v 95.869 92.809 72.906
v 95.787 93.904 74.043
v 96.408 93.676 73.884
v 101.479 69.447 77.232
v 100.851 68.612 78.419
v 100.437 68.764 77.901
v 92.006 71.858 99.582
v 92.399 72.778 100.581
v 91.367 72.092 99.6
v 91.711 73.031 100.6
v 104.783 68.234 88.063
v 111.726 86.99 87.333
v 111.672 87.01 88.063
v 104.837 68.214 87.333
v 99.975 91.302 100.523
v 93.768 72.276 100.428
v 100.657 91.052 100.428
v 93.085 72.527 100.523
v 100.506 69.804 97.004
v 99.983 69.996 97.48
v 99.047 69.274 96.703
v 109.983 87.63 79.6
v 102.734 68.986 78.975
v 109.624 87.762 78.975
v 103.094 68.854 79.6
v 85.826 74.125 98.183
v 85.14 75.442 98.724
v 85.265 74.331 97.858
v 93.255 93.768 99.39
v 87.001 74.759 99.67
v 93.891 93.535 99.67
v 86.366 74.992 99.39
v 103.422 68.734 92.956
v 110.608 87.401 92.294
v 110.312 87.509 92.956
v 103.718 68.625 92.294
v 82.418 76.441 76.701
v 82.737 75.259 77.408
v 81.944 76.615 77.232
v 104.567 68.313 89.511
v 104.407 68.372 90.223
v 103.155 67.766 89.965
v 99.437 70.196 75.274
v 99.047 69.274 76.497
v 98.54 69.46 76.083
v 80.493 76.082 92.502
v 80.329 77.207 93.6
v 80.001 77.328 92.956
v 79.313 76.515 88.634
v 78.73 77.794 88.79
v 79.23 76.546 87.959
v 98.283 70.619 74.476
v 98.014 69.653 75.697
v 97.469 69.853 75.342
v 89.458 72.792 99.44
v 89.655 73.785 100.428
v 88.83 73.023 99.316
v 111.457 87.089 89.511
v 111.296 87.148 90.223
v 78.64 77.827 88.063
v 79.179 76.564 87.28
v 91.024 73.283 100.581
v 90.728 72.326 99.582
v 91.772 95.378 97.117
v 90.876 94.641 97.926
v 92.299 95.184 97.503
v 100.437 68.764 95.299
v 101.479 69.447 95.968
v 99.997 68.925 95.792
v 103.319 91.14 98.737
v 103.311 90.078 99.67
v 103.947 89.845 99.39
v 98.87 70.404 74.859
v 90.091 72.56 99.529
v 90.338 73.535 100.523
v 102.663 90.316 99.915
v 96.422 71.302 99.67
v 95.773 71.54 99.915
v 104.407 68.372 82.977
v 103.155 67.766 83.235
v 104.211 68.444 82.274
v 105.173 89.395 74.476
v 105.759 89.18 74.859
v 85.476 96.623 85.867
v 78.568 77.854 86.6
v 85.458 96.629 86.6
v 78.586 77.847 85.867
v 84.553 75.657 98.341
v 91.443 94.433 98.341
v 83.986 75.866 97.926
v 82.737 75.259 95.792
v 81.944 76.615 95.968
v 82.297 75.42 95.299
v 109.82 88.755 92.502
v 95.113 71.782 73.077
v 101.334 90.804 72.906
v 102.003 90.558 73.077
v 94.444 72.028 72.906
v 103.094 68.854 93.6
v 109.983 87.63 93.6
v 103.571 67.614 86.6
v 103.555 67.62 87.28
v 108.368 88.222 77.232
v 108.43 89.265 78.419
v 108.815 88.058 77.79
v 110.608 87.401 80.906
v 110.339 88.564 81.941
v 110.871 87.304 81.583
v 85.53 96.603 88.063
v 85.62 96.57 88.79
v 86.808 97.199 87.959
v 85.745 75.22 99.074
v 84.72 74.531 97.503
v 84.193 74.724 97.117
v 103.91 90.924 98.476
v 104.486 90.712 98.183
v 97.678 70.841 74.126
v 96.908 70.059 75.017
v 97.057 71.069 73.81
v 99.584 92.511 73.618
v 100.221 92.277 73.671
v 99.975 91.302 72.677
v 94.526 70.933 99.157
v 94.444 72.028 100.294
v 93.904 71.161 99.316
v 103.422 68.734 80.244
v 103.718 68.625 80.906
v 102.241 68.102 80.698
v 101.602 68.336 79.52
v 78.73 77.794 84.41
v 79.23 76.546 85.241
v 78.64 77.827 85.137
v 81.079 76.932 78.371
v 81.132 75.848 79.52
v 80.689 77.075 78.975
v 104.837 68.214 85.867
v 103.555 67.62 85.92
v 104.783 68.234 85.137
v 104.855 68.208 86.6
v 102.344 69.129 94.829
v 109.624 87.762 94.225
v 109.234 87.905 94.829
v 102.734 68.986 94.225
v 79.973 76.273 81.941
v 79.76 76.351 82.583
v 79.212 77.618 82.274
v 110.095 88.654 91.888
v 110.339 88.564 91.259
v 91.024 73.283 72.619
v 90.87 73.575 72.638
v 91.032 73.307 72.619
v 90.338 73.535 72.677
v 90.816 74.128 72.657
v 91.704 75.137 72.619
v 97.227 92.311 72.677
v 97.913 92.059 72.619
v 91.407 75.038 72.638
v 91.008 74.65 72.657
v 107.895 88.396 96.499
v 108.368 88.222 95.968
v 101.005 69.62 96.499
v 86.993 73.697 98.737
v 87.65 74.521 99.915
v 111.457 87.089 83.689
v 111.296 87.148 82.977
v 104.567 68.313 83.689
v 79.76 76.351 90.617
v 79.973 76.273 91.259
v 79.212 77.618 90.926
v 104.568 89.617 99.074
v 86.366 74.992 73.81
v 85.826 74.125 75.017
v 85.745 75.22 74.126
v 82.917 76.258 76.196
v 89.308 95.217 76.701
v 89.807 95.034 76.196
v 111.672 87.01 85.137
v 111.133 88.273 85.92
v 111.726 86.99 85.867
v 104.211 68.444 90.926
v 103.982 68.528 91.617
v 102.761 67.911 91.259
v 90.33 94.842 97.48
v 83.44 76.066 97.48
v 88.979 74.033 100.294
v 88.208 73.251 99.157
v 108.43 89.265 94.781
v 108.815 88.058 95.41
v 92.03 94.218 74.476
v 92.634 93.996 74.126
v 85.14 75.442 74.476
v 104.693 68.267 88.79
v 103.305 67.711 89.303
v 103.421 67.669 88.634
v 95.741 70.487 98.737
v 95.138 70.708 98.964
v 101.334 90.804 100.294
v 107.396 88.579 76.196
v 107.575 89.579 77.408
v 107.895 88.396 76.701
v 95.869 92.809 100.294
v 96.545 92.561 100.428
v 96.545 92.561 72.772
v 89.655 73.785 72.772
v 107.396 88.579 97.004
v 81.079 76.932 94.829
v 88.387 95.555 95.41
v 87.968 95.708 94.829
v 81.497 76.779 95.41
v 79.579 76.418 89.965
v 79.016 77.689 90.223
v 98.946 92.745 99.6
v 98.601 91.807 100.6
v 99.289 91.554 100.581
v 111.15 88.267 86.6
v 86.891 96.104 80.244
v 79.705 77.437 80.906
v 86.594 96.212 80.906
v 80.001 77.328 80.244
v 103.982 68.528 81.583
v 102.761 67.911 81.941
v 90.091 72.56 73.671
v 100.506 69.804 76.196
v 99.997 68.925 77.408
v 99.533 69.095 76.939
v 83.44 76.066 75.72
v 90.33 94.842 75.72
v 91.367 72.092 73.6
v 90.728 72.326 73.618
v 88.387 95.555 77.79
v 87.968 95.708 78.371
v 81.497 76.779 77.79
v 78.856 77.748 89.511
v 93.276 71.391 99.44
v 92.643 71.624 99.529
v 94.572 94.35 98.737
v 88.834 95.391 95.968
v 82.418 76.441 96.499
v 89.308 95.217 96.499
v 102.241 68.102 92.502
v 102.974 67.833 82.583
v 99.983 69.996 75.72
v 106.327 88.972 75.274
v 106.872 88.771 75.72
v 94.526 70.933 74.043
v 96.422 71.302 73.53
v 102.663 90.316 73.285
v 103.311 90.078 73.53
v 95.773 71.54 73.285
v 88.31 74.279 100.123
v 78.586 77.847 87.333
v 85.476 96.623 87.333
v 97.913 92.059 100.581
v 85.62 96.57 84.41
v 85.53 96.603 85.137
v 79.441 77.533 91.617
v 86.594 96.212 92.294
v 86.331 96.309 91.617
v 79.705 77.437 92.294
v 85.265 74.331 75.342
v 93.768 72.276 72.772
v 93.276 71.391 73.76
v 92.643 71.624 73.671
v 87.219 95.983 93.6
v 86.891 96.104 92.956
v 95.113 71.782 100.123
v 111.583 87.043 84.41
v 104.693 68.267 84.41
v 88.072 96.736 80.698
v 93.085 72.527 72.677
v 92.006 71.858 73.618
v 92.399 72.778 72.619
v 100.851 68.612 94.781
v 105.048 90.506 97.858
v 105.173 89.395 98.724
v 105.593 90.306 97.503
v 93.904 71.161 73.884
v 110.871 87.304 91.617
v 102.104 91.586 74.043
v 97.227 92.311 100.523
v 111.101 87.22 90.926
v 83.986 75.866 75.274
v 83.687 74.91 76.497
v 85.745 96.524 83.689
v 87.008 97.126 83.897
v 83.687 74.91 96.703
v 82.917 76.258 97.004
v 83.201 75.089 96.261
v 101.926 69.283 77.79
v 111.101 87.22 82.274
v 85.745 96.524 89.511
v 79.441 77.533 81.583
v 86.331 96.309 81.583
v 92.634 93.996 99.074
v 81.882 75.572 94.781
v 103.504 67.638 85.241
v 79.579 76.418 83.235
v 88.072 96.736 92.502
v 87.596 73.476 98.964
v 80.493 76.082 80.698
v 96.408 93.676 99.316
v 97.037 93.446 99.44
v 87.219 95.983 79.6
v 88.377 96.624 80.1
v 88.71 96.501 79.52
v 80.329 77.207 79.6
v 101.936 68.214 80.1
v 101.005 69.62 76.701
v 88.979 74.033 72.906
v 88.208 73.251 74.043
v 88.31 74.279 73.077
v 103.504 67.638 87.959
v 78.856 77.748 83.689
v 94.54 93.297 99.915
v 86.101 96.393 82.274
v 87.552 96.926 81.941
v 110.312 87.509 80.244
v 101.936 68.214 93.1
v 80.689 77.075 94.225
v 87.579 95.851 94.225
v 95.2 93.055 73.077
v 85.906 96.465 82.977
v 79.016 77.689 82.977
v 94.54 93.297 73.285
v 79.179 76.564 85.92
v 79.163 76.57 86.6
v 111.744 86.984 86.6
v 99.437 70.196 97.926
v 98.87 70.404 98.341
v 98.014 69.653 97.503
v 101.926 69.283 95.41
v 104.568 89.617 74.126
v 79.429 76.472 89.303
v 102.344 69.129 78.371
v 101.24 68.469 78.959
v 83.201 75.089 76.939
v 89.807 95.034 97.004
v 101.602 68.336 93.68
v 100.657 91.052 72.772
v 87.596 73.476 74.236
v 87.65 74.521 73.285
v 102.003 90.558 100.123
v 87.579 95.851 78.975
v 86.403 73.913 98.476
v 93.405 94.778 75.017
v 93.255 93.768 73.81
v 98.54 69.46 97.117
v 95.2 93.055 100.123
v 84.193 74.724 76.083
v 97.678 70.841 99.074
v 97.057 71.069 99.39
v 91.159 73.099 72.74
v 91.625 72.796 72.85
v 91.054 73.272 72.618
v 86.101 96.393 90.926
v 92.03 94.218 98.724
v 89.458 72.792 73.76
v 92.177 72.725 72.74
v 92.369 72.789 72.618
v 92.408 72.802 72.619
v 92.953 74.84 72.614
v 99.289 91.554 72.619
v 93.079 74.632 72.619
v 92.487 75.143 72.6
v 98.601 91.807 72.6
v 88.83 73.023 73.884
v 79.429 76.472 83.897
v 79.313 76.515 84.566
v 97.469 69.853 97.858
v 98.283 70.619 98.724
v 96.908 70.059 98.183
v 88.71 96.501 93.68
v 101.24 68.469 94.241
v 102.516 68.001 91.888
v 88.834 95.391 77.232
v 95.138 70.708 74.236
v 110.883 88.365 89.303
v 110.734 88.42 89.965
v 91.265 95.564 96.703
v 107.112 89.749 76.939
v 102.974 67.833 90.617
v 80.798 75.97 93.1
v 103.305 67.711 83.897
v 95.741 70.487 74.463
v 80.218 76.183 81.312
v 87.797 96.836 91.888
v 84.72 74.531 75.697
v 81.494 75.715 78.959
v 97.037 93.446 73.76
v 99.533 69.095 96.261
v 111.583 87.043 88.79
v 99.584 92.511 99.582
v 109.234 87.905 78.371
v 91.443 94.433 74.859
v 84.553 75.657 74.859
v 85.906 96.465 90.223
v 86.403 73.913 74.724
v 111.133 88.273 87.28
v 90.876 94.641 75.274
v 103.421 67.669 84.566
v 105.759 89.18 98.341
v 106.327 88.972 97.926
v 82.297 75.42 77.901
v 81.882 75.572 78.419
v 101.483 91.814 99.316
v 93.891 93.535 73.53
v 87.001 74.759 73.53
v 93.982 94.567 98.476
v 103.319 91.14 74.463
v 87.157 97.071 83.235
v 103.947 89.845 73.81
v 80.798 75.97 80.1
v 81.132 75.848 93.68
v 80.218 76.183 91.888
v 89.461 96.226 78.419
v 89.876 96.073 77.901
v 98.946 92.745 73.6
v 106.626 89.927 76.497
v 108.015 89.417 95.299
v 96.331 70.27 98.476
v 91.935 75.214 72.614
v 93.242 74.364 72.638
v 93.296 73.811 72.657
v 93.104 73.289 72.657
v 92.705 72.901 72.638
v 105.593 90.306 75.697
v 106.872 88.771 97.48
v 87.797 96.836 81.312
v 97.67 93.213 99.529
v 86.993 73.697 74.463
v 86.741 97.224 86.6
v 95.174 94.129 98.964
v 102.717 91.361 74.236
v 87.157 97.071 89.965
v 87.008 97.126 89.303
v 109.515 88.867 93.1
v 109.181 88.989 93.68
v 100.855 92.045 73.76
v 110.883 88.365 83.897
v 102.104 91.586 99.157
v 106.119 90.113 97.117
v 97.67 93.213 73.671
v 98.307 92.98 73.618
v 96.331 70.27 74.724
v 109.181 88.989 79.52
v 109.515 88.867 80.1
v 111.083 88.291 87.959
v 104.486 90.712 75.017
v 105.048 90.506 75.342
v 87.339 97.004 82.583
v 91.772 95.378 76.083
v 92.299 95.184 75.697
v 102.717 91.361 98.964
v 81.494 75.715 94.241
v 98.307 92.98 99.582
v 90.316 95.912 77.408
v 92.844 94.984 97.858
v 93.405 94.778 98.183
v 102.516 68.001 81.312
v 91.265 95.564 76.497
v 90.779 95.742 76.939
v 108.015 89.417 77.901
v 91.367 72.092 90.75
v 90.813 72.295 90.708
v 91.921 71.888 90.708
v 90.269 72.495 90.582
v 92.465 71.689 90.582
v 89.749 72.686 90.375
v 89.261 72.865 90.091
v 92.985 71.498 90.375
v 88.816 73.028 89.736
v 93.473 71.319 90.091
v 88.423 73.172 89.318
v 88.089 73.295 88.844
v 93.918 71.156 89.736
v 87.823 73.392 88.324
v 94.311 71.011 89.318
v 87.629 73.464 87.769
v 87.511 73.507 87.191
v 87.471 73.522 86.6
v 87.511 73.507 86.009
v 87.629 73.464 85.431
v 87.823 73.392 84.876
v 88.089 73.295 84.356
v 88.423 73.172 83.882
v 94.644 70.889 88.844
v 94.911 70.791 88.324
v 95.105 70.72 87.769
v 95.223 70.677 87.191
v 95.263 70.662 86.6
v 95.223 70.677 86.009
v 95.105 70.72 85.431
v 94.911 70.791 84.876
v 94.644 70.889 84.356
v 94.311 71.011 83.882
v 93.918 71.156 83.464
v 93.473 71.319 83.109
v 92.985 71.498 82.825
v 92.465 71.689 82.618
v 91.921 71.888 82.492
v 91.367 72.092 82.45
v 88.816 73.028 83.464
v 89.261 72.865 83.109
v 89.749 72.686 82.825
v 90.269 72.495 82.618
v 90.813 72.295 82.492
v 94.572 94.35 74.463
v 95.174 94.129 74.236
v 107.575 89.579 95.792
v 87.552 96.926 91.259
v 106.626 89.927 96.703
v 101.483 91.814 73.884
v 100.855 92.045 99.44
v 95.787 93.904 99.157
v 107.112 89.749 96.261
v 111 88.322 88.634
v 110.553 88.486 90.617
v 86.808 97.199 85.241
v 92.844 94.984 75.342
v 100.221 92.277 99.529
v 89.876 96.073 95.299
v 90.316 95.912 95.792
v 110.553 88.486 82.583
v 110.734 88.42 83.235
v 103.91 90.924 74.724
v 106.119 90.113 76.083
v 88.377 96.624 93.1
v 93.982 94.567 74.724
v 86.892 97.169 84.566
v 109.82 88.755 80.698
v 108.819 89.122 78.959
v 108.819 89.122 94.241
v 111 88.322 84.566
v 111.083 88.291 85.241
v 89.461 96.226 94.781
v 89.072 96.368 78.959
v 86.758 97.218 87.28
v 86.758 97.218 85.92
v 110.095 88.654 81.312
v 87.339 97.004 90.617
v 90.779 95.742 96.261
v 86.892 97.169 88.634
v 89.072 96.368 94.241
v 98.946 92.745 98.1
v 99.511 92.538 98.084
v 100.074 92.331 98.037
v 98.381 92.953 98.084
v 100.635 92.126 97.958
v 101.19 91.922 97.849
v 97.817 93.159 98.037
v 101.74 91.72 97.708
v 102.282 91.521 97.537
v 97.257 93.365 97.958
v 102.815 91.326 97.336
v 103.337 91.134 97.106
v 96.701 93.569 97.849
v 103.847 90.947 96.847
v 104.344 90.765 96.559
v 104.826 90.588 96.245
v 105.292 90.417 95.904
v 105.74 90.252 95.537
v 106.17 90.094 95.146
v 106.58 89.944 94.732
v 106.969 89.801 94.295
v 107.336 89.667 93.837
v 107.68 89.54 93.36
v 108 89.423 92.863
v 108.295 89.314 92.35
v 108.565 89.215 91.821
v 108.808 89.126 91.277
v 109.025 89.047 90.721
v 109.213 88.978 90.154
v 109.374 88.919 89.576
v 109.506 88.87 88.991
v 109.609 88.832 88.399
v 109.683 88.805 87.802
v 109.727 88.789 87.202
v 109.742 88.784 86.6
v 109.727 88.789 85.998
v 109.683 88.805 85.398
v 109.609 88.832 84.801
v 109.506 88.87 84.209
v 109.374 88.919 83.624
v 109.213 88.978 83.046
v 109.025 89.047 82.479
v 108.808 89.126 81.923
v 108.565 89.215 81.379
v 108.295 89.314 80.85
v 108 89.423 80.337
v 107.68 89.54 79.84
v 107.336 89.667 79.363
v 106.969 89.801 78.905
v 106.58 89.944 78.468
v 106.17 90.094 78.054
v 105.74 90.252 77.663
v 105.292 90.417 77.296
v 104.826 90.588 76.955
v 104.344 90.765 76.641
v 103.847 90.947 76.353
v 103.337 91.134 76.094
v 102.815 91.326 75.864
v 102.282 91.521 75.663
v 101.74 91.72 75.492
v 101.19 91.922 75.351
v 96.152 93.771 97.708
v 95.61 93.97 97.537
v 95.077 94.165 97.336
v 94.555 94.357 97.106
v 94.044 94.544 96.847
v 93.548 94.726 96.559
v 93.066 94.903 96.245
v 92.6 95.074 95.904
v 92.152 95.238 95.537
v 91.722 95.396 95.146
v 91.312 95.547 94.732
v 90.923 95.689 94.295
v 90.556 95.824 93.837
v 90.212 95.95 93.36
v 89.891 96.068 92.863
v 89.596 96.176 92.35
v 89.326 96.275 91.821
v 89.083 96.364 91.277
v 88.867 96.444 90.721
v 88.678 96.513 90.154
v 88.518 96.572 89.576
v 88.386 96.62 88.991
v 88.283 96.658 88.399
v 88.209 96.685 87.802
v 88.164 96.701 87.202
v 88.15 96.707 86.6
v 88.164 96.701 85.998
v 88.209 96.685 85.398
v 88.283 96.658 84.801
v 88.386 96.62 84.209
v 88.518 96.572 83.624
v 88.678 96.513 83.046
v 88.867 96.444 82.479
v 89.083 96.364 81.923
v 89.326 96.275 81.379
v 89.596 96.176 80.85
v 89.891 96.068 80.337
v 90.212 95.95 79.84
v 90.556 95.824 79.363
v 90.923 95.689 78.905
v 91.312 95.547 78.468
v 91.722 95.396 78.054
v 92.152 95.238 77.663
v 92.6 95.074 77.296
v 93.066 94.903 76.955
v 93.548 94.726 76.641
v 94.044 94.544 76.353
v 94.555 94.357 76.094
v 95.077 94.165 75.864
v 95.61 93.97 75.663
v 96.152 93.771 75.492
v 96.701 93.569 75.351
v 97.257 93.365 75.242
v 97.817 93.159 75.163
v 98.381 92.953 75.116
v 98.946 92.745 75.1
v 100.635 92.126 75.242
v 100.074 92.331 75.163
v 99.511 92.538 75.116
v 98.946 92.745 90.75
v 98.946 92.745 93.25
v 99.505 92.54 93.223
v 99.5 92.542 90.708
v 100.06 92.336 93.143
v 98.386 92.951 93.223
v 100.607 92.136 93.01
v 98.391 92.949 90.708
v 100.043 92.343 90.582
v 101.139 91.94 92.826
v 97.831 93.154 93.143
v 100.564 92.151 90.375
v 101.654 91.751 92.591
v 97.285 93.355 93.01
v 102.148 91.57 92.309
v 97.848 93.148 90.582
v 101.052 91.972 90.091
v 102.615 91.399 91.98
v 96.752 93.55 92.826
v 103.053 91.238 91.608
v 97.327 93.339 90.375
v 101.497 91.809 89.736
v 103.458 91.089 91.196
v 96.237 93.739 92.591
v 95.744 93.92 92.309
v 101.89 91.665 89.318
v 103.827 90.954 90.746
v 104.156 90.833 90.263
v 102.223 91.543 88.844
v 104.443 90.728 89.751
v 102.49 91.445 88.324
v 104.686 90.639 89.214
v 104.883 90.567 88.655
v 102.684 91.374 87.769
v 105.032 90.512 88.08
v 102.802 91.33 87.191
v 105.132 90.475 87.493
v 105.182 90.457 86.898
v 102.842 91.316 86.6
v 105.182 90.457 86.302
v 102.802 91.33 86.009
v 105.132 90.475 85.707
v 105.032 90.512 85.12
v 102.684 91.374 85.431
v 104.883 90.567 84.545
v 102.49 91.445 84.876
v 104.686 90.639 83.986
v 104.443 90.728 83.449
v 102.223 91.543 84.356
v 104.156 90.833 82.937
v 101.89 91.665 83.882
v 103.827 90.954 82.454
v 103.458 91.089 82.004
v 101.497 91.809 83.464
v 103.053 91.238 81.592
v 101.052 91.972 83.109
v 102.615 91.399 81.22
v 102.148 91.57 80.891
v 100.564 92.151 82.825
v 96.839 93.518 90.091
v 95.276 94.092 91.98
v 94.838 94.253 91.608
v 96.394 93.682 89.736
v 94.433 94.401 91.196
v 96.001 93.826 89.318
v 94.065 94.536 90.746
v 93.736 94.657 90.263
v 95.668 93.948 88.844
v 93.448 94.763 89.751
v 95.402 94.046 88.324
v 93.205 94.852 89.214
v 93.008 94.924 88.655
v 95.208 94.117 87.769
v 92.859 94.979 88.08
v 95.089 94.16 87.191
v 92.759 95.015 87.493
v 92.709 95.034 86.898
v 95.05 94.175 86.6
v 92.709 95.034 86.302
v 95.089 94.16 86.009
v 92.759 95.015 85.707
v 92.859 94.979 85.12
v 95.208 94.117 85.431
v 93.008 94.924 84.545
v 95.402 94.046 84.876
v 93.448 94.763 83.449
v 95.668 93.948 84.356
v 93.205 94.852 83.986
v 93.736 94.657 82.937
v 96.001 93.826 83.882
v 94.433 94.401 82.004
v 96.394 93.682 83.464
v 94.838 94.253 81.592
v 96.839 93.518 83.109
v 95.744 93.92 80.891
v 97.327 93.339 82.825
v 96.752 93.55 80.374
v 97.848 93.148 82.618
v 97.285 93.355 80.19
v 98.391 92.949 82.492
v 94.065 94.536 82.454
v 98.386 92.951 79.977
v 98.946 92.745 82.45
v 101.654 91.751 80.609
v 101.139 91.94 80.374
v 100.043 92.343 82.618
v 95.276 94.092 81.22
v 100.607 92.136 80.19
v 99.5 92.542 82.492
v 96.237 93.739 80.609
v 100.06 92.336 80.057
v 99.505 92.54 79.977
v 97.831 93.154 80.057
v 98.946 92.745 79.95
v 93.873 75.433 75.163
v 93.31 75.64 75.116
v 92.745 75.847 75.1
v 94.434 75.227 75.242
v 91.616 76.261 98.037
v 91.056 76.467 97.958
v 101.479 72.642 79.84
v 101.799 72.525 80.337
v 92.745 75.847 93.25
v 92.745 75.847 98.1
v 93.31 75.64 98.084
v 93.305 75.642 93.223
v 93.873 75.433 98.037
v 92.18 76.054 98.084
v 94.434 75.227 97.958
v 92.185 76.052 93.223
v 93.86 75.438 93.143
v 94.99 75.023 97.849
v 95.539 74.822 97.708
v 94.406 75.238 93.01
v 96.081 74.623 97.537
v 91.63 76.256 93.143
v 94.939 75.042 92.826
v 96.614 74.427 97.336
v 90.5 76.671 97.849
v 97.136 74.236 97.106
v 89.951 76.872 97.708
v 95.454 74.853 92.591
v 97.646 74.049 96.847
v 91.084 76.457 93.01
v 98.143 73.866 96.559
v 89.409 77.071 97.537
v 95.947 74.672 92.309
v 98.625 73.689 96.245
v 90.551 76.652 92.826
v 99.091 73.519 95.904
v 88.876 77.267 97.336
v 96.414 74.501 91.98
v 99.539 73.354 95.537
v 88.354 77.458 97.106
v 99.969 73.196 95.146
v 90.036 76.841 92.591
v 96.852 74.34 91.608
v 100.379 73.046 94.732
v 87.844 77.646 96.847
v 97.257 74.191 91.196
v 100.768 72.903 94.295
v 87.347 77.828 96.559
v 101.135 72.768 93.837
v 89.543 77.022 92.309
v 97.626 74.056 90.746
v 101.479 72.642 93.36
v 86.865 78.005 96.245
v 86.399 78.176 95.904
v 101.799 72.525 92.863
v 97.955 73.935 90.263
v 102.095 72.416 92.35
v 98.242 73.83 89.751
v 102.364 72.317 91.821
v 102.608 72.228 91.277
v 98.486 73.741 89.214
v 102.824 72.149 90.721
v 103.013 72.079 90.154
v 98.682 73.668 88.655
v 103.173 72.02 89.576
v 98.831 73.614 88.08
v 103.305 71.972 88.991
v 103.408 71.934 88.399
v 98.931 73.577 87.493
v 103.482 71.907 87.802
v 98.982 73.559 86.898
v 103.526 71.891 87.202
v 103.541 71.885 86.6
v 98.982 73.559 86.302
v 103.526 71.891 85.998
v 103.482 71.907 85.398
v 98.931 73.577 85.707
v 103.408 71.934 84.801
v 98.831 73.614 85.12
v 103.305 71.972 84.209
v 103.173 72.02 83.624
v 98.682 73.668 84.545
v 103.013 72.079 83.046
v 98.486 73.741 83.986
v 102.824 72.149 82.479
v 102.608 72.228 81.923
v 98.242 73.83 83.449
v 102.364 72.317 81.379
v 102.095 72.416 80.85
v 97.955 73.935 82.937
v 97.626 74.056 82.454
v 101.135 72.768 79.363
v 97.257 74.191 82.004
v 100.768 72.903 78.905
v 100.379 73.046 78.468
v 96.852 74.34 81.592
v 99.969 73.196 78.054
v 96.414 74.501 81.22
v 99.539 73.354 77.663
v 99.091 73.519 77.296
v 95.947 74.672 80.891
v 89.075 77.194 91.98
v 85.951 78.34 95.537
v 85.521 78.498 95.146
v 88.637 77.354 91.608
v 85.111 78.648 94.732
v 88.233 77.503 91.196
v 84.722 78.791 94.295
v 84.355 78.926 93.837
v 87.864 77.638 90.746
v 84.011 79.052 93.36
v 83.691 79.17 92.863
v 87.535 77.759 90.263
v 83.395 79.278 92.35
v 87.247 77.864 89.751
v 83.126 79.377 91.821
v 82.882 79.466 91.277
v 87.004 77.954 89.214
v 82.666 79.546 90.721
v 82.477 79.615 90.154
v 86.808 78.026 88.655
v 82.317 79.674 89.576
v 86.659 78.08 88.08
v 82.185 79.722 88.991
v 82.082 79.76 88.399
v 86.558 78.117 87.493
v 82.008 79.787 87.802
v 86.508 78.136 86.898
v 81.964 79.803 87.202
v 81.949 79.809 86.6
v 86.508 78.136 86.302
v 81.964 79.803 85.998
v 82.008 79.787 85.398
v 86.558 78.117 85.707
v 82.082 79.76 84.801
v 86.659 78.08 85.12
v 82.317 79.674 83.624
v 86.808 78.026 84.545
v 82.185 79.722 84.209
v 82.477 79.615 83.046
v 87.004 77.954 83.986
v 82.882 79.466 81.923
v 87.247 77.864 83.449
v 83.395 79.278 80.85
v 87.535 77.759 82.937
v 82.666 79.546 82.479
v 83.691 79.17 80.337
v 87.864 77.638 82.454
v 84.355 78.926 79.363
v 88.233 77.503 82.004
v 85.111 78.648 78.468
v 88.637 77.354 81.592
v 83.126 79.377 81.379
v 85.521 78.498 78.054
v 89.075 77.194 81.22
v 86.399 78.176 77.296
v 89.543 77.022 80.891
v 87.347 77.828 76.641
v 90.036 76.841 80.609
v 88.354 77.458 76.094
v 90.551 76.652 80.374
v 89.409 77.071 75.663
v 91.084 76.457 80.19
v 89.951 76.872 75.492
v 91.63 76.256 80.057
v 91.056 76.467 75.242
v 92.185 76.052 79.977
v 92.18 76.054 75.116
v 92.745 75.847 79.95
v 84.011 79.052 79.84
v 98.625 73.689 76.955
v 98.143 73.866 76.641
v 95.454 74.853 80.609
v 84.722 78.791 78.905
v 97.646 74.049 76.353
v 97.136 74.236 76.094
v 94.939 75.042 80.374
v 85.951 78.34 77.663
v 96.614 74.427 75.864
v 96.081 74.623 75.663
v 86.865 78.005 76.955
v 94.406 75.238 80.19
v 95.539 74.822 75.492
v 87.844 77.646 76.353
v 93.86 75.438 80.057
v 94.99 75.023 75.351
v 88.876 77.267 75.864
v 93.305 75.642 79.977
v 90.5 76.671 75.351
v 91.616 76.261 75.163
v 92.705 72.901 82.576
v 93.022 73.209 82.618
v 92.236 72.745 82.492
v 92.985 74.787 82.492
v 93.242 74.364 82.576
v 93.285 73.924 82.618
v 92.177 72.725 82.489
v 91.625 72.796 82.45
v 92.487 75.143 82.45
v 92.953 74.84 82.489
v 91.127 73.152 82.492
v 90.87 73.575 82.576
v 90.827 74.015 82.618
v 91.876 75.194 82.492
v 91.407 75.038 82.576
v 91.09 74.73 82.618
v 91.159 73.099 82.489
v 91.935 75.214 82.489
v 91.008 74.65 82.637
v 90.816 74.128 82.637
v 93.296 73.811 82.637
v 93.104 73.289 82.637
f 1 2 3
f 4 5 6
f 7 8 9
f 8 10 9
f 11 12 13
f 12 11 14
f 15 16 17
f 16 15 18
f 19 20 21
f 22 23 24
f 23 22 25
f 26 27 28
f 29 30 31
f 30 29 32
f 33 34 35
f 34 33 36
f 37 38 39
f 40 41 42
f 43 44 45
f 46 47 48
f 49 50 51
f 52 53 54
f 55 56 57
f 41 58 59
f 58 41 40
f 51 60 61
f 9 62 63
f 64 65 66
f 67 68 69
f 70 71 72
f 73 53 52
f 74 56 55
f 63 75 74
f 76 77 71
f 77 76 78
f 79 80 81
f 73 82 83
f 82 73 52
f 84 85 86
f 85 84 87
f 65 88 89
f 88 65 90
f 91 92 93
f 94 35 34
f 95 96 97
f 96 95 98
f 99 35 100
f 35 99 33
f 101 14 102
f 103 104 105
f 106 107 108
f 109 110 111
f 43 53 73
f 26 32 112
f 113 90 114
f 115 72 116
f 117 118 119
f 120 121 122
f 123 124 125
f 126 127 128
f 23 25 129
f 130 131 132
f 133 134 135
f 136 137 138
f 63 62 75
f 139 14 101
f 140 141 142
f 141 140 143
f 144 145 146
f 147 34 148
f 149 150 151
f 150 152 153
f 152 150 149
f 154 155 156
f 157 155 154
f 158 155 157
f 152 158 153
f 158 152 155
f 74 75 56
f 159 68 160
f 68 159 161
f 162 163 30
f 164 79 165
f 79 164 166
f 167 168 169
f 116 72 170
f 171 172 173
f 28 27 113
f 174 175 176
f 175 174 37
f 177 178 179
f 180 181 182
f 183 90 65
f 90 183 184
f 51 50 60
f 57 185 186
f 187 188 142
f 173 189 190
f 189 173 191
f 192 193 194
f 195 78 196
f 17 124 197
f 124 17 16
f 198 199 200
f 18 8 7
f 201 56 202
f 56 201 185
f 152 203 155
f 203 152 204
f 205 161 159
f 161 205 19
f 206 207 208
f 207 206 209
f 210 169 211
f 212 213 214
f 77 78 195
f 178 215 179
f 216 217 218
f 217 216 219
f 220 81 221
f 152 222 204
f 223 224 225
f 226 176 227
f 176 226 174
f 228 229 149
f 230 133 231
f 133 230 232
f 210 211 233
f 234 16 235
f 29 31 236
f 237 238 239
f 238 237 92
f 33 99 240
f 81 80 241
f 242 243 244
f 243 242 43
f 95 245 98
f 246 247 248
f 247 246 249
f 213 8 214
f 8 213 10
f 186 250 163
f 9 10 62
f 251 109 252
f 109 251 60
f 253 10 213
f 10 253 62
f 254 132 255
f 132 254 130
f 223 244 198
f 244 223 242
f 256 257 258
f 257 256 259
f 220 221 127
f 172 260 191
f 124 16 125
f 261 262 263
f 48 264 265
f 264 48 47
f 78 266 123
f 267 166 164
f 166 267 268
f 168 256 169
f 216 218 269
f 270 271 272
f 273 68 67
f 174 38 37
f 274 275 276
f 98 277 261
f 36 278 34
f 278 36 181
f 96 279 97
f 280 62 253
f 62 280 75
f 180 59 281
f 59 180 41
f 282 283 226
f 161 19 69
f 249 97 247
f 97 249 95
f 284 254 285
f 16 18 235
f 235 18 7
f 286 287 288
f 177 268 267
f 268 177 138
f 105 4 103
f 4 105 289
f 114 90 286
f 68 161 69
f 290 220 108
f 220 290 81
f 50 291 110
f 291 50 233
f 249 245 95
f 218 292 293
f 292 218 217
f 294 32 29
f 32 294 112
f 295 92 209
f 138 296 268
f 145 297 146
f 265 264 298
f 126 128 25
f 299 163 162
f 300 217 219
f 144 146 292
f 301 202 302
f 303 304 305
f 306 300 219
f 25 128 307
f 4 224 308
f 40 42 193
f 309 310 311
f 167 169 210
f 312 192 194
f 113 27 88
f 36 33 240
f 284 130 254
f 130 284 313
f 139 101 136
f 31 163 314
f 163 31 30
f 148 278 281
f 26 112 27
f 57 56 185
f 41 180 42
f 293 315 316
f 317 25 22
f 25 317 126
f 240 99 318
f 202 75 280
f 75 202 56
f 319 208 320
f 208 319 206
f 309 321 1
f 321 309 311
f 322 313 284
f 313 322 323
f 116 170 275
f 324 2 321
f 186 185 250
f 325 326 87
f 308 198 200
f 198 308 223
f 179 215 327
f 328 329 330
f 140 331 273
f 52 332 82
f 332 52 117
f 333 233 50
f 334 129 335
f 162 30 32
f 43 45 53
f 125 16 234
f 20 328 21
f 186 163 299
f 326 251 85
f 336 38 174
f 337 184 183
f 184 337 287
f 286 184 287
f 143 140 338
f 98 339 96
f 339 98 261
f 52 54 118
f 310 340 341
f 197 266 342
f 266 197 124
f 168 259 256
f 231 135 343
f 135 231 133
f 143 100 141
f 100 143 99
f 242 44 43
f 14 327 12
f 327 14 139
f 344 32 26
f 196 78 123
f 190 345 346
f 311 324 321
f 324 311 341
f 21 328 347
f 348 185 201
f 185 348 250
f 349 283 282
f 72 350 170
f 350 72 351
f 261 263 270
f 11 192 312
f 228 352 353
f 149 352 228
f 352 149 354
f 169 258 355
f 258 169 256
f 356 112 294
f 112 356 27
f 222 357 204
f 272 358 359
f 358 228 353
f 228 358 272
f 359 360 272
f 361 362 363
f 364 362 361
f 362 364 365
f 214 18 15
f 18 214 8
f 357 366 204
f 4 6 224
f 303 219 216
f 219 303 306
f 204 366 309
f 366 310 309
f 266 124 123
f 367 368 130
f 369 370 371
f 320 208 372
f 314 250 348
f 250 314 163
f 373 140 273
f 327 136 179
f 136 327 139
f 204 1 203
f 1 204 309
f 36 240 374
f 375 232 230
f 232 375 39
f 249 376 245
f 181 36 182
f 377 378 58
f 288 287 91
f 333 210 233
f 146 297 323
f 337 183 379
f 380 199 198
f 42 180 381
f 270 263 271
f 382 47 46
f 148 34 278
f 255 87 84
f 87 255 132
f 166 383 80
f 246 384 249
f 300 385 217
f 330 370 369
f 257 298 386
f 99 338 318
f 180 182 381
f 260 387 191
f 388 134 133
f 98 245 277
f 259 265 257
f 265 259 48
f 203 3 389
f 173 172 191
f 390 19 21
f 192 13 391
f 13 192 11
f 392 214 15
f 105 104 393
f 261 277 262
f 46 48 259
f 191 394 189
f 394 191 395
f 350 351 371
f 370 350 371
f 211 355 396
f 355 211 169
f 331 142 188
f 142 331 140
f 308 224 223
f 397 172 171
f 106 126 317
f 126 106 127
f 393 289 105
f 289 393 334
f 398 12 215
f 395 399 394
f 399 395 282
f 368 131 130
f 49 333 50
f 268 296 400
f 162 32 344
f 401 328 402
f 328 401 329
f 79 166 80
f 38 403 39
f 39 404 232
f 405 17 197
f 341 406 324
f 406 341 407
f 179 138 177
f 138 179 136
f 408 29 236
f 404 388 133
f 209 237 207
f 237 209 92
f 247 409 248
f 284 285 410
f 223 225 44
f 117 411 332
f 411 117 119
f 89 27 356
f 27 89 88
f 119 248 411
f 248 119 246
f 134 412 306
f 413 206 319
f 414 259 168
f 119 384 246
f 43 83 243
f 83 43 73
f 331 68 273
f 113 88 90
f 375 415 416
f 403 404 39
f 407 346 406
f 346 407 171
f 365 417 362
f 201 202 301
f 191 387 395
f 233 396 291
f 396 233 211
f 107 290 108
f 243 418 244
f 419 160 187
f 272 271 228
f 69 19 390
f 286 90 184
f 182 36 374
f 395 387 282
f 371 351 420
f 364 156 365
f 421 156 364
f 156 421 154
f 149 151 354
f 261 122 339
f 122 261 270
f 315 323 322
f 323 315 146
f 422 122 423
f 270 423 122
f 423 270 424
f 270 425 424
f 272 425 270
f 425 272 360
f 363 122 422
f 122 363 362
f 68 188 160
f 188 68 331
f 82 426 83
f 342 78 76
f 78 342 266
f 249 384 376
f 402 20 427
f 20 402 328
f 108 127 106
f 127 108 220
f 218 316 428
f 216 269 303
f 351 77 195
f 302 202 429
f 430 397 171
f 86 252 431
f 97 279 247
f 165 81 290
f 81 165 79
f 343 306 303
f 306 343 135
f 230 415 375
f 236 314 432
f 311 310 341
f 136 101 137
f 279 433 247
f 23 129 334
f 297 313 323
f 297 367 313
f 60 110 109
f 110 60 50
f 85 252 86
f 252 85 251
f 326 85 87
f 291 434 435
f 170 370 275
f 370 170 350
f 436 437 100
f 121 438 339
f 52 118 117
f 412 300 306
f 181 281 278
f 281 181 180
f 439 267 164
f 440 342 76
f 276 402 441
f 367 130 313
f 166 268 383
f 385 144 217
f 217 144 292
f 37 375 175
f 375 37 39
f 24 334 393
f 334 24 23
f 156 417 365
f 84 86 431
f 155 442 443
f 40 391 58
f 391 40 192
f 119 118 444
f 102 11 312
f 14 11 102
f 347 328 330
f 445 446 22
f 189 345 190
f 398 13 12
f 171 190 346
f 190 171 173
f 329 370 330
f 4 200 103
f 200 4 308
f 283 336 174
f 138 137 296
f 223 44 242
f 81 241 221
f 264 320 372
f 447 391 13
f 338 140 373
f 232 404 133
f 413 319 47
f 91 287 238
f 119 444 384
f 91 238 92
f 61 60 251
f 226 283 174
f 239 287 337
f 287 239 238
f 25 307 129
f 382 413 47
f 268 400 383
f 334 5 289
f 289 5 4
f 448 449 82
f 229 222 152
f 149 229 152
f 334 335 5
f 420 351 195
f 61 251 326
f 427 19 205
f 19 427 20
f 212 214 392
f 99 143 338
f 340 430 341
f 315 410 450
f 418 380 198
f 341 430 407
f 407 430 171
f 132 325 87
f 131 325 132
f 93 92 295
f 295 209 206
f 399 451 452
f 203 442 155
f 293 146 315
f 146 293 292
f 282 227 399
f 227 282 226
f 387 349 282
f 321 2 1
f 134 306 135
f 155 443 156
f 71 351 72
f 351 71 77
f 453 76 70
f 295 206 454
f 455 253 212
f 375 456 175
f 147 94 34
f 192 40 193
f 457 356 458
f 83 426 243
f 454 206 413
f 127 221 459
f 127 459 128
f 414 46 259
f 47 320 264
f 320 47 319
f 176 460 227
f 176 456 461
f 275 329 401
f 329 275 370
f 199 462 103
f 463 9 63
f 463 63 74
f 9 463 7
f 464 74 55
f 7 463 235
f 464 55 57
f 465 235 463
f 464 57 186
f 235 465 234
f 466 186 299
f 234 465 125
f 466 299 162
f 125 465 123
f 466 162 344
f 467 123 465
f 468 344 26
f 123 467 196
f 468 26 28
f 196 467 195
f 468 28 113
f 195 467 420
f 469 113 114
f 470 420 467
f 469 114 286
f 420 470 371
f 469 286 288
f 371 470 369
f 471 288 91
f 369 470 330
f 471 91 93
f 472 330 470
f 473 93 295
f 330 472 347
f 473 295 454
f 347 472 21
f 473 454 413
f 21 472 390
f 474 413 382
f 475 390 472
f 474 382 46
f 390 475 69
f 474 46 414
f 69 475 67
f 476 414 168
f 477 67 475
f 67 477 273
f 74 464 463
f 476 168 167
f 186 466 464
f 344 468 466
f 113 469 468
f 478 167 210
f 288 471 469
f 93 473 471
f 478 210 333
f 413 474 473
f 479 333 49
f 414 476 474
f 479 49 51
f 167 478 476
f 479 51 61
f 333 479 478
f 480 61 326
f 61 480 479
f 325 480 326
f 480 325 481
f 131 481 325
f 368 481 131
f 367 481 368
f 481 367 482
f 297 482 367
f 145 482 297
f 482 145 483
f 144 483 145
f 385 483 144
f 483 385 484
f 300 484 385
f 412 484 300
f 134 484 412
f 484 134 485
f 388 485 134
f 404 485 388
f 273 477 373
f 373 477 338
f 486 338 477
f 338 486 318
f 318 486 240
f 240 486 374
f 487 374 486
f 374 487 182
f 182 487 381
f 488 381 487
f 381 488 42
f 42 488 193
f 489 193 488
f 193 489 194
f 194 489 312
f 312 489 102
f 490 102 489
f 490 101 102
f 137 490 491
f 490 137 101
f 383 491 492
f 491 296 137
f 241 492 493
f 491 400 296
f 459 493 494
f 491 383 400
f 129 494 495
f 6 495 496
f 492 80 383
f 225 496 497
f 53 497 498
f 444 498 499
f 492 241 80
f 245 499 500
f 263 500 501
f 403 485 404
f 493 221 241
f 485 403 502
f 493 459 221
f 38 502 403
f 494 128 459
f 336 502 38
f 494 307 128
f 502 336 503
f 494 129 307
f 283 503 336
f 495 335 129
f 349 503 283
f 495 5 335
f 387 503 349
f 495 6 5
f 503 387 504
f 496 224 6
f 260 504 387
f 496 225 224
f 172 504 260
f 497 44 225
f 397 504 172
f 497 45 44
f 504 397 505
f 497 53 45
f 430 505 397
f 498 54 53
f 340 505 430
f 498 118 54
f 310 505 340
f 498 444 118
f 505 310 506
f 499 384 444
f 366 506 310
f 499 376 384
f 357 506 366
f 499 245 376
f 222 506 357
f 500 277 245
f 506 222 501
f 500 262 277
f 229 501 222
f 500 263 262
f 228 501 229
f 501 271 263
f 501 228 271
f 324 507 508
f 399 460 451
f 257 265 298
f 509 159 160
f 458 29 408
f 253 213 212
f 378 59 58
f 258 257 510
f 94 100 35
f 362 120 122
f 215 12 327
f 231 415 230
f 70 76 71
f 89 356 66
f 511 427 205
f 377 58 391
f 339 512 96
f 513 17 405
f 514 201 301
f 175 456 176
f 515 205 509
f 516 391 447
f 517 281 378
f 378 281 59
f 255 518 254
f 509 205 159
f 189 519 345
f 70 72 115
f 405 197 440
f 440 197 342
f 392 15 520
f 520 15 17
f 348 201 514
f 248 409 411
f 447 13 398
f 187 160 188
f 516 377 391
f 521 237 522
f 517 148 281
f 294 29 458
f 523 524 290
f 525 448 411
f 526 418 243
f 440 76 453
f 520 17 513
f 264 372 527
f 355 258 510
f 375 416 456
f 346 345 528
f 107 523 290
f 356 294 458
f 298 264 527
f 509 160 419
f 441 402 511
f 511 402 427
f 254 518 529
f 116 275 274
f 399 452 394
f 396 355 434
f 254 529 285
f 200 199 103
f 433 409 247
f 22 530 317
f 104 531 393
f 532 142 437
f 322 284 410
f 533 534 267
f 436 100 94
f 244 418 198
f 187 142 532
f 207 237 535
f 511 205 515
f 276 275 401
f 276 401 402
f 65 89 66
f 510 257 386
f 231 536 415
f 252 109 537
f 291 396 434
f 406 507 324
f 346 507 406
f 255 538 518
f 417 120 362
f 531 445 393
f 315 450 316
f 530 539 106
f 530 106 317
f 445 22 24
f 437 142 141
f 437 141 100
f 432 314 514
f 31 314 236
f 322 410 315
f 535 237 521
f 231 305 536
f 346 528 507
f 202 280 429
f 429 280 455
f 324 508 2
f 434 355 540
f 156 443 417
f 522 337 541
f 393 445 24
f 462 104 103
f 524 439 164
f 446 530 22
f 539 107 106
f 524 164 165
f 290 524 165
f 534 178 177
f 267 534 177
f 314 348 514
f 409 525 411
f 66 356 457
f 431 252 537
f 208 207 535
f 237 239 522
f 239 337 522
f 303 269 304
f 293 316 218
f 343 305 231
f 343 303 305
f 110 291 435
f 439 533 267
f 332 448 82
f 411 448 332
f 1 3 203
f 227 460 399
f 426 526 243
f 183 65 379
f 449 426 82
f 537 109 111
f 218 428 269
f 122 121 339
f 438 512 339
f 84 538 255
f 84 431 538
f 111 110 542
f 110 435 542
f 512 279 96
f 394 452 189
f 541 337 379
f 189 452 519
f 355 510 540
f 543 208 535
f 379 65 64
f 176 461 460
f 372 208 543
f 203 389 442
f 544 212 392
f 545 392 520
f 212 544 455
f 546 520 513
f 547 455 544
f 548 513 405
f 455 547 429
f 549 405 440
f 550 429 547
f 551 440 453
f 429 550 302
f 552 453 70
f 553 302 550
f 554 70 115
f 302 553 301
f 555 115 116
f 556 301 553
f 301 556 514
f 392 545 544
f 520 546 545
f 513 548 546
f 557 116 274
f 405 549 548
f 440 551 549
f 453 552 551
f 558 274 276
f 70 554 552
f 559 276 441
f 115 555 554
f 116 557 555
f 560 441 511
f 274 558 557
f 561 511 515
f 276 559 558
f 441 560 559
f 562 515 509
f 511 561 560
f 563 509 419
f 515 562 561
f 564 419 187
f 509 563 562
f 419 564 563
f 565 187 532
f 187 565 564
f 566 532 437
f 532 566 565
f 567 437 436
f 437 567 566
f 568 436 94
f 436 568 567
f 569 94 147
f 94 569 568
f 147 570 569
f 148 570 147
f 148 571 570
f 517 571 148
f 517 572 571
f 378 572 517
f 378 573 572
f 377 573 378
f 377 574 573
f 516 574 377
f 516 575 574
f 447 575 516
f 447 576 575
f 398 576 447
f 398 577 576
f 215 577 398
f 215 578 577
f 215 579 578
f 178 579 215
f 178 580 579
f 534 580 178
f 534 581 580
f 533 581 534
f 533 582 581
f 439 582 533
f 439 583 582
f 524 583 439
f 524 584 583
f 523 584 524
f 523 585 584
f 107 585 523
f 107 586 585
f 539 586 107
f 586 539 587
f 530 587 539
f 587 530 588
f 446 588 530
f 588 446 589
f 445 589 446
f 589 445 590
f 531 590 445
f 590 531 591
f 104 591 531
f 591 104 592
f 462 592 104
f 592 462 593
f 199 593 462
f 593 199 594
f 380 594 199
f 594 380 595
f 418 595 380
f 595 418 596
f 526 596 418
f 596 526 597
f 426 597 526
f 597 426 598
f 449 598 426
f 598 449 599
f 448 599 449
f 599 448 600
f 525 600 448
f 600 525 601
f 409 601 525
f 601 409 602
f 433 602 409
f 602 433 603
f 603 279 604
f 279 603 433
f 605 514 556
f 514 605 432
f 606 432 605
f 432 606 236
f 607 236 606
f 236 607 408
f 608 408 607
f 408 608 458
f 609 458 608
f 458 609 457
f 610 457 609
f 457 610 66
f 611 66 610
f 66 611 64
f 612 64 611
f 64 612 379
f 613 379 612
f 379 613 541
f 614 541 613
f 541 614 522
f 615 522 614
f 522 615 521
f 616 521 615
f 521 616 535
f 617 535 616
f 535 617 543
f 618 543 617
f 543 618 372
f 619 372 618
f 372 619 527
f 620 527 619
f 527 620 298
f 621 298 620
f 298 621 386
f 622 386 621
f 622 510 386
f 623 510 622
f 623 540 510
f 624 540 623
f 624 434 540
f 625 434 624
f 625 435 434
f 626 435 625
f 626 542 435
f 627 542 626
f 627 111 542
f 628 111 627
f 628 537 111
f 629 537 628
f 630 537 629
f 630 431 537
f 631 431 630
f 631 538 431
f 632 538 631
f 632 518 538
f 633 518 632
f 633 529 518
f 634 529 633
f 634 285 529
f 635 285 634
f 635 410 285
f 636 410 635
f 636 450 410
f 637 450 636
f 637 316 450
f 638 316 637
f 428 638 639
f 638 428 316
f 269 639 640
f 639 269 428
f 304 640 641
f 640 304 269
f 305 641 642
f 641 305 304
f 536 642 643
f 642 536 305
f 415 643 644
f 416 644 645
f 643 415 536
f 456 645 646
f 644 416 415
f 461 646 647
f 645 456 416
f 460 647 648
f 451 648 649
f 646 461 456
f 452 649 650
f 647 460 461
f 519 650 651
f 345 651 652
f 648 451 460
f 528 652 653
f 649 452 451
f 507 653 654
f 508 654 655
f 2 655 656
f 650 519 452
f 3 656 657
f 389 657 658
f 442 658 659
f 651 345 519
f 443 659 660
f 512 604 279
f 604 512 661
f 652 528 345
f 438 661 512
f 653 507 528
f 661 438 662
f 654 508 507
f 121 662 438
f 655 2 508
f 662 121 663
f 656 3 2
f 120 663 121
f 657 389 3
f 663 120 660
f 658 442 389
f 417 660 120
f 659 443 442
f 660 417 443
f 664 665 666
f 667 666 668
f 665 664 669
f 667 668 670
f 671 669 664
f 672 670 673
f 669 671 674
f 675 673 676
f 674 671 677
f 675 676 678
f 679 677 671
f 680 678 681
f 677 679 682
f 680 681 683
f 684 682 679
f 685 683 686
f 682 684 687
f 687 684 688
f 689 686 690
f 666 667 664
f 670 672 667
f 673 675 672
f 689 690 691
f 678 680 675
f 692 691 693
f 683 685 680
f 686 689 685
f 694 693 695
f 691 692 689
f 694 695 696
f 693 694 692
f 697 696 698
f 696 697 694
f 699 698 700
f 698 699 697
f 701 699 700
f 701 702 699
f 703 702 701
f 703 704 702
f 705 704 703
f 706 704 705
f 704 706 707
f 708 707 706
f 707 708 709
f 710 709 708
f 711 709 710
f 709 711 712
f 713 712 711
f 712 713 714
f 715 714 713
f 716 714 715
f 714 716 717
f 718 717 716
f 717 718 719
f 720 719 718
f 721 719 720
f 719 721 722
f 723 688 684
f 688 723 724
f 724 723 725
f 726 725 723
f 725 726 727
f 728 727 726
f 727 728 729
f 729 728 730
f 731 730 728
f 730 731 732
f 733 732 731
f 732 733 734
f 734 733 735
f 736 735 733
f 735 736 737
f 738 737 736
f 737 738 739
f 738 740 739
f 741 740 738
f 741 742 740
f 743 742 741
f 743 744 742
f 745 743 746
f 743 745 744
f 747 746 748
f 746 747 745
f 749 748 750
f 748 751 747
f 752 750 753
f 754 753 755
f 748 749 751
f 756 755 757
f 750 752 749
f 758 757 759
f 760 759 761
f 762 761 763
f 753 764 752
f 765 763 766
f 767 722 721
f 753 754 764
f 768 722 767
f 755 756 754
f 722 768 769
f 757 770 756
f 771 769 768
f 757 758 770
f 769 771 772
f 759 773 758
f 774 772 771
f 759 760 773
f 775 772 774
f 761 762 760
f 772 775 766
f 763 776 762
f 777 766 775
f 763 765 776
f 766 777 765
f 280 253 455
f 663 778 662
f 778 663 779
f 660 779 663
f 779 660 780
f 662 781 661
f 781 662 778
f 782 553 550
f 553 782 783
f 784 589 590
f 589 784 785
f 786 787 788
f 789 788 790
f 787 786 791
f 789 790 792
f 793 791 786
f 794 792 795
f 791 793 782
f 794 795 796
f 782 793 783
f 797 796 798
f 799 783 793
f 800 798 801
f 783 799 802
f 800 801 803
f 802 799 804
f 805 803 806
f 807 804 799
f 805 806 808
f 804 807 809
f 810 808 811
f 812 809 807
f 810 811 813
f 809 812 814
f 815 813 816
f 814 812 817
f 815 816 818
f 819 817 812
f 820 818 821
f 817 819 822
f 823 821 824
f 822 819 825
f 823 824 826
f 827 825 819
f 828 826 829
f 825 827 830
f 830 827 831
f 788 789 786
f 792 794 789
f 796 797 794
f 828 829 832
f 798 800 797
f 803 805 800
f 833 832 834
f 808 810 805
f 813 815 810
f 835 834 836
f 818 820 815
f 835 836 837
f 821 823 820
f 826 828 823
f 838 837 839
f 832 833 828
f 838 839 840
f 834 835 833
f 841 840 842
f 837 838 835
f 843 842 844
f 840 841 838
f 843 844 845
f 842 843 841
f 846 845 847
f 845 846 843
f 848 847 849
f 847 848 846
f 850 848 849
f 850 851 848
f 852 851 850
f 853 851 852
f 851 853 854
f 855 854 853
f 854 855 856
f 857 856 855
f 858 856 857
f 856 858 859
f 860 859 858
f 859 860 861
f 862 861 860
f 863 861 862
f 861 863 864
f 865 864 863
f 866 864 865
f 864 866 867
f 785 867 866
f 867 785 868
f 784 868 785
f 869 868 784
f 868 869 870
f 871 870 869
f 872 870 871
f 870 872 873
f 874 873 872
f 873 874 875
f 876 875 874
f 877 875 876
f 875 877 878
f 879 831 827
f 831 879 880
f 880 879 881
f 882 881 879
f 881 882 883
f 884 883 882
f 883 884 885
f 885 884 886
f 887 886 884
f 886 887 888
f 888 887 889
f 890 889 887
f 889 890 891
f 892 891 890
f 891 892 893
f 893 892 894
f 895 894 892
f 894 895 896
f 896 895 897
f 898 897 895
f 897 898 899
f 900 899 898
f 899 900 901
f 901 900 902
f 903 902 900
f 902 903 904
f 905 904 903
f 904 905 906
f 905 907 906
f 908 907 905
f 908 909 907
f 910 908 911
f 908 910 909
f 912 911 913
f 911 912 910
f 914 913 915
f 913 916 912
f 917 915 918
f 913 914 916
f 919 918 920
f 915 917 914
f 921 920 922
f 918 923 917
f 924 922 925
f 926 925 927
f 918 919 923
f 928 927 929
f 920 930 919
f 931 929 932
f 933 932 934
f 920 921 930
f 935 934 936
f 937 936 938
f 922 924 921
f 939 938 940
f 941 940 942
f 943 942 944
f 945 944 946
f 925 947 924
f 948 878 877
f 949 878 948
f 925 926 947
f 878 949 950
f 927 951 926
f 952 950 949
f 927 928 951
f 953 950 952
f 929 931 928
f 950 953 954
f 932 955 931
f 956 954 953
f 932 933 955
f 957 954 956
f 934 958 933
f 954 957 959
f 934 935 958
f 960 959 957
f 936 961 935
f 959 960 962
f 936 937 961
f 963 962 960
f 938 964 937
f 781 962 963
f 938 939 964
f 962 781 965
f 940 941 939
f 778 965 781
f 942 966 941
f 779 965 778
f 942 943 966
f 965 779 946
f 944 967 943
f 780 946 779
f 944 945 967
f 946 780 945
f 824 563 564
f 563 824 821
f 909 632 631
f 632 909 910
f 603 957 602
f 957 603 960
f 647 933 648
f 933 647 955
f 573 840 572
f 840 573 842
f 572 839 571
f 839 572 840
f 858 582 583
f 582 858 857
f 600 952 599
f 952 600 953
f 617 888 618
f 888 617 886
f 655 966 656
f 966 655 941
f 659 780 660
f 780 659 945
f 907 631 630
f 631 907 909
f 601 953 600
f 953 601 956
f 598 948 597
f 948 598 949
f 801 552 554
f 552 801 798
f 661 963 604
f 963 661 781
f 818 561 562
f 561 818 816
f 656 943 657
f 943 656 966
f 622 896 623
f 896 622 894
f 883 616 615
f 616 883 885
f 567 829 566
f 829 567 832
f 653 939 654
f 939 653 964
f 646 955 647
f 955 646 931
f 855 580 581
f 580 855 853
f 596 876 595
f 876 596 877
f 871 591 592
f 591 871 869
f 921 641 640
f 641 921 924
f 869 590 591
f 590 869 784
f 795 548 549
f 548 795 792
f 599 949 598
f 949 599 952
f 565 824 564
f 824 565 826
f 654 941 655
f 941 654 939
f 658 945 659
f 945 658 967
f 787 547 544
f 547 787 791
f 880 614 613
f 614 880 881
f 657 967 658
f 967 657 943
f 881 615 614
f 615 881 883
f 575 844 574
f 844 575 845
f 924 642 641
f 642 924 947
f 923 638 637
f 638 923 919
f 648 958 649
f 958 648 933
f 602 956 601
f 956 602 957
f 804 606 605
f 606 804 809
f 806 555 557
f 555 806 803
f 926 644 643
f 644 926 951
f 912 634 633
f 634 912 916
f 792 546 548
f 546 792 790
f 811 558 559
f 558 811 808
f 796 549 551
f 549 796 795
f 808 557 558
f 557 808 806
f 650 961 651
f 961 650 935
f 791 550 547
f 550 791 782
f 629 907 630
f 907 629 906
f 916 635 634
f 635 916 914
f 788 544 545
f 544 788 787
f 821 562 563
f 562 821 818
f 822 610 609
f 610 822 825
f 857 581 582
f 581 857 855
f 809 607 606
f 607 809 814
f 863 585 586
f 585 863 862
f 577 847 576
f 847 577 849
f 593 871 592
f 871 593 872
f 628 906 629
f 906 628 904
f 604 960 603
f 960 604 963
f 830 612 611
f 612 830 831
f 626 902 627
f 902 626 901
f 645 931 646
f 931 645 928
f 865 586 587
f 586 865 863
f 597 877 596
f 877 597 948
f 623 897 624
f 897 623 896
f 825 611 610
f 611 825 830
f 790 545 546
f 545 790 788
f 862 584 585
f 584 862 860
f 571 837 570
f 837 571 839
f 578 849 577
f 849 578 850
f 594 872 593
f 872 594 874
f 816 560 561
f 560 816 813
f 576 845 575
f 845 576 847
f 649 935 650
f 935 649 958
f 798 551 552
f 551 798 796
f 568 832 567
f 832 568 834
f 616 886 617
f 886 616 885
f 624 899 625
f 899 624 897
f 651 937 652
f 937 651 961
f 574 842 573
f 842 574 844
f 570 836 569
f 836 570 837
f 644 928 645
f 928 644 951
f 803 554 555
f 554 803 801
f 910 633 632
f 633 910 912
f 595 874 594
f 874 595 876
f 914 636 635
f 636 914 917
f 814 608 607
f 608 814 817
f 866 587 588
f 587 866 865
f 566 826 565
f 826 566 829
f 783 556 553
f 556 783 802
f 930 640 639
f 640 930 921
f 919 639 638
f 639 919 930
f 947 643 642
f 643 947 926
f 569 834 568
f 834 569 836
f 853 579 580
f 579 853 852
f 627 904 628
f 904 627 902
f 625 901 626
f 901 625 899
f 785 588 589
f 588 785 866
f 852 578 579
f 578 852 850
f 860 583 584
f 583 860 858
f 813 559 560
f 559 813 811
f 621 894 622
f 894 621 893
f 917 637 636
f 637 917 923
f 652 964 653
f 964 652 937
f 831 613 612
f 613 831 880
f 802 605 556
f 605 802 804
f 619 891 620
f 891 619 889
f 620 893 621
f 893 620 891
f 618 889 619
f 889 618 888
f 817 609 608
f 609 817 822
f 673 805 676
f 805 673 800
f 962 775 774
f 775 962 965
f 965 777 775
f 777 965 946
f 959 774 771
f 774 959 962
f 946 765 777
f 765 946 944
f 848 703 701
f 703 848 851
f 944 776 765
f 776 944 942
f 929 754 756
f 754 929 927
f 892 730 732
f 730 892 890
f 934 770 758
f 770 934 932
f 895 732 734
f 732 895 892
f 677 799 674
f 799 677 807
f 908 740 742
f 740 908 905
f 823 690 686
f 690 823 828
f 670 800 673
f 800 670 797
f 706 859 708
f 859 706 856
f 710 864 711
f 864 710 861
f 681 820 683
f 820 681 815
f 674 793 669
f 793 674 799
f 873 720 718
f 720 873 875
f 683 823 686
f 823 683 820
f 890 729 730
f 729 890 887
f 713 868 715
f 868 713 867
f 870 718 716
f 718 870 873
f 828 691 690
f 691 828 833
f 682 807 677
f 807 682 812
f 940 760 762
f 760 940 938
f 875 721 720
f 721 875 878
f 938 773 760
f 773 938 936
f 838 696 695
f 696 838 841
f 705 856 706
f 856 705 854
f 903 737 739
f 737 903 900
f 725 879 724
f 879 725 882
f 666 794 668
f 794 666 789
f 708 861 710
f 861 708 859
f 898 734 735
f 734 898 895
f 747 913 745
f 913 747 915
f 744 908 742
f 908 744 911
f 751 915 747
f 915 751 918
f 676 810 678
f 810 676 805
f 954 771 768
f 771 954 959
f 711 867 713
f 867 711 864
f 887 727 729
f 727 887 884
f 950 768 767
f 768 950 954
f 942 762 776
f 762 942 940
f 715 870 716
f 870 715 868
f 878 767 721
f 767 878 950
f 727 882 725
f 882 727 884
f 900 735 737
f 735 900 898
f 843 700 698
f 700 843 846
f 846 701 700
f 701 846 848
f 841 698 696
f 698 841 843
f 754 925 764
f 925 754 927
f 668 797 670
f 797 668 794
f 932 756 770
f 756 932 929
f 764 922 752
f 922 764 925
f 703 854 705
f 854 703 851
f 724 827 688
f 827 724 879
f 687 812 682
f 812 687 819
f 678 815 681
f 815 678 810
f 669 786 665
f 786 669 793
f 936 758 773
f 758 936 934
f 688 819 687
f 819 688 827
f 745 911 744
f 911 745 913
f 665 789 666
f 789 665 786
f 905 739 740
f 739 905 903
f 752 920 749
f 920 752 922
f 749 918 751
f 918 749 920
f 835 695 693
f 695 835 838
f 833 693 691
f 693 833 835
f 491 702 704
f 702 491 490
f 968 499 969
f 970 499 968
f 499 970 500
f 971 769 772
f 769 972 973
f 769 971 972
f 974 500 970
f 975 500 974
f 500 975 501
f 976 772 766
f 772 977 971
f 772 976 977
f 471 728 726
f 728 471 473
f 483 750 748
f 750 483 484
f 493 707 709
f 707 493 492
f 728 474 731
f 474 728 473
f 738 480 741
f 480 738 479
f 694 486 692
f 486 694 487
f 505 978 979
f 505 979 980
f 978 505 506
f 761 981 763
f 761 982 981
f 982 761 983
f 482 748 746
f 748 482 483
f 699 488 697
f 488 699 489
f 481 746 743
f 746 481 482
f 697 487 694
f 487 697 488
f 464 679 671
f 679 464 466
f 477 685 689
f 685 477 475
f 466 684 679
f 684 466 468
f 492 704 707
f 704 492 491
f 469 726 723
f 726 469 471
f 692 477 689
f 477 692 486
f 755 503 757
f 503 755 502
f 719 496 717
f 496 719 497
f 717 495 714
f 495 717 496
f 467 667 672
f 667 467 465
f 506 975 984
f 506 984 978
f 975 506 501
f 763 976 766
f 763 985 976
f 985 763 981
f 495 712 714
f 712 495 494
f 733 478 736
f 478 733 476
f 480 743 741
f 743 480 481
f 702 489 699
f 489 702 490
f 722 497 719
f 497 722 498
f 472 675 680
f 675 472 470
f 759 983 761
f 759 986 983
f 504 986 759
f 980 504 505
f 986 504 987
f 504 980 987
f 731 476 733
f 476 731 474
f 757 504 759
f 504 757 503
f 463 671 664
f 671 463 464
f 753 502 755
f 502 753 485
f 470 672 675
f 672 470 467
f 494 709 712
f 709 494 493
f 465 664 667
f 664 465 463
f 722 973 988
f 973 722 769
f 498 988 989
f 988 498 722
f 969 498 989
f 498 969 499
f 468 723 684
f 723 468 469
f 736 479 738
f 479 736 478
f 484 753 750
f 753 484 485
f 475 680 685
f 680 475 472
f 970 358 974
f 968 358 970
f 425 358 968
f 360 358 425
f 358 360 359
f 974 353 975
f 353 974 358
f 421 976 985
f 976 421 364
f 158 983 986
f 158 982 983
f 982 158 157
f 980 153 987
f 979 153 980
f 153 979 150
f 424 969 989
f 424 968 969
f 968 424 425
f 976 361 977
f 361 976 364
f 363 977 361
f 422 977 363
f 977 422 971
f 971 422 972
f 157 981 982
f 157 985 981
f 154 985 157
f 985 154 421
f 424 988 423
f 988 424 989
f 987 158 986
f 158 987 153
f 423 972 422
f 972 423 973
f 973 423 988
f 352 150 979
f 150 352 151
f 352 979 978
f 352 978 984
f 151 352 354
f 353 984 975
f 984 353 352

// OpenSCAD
// file: ../lib/common.scad
// ============================================================================
//  Вспомогательные модули общего назначения.
//  Подключать через use <lib/common.scad> — файл не содержит параметров
//  проекта и ни от чего не зависит.
// ============================================================================

_eps = 0.01;

// --------------------------------------------------------------------- 2D ---
// Прямоугольник со скруглёнными углами, по центру
module rrect(w, d, r) {
    rr = min(r, w/2 - _eps, d/2 - _eps);
    if (rr > 0) offset(r = rr) square([w - 2*rr, d - 2*rr], center = true);
    else square([w, d], center = true);
}

// --------------------------------------------------------------------- 3D ---
// Коробка со скруглением ТОЛЬКО вертикальных рёбер: нижние и верхние острые
module rounded_box(w, d, h, r) linear_extrude(height = h) rrect(w, d, r);

// Цилиндр с фасками на торцах (снимает «слоновью ногу» и облегчает посадку)
module chamfered_cyl(d, h, ch = 0.6, bottom = true, top = true) {
    r  = d/2;
    cb = bottom ? min(ch, h/2) : 0;
    ct = top    ? min(ch, h/2) : 0;
    if (cb <= 0 && ct <= 0) cylinder(d = d, h = h);
    else rotate_extrude(angle = 360) polygon(concat(
        [[0, 0]],
        cb > 0 ? [[r - cb, 0], [r, cb]] : [[r, 0]],
        ct > 0 ? [[r, h - ct], [r - ct, h]] : [[r, h]],
        [[0, h]]));
}

// Труба
module tube(od, id, h) difference() {
    cylinder(d = od, h = h);
    translate([0, 0, -_eps]) cylinder(d = id, h = h + 2*_eps);
}

// Сквозное отверстие, растянутое вверх-вниз для гарантированного вычитания
module thru(d, h) translate([0, 0, -_eps]) cylinder(d = d, h = h + 2*_eps);

// Потайное отверстие под саморез с конической головкой.
// Пластина занимает z = [0 .. t], головка утапливается сверху,
// саморез идёт вниз (в ответную стойку).
module countersunk_hole(free_d, head_d, t, down = 30) {
    cone_h = (head_d - free_d)/2;    // головка 90 градусов
    union() {
        translate([0, 0, -down]) cylinder(d = free_d, h = down + t - cone_h + _eps);
        translate([0, 0, t - cone_h]) cylinder(d1 = free_d, d2 = head_d, h = cone_h);
    }
}

// Паз (щелевое отверстие) длиной len по X, сквозной по высоте h
module slot(len, d, h) hull() for (s = [-1, 1])
    translate([s*(len - d)/2, 0, 0]) cylinder(d = d, h = h);

// Стойка под саморез: цилиндр с пилотным отверстием сверху.
// Снизу фаски нет — стойка растёт из дна детали.
module screw_boss(od, h, pilot_d, pilot_depth, ch = 0.6) difference() {
    chamfered_cyl(od, h, ch = ch, bottom = false, top = true);
    translate([0, 0, h - pilot_depth]) cylinder(d = pilot_d, h = pilot_depth + _eps);
}

// Треугольная косынка в плоскости XZ (катеты l по X и h по Z), толщина t по Y
module gusset(l, h, t) translate([0, -t/2, 0]) linear_extrude(height = t)
    polygon([[0, 0], [l, 0], [0, h]]);

// Конусное гнездо под заточенный винт-ось (ось Z вниз от z=0)
module cone_seat(d, depth) translate([0, 0, -depth])
    cylinder(d1 = 0.2, d2 = d, h = depth + _eps);

// Канавка под круглый пассик: тор, вычитаемый из обода
module belt_groove(pulley_d, groove_r) rotate_extrude(angle = 360)
    translate([pulley_d/2, 0]) circle(r = groove_r);

// Сетка облегчающих отверстий по кругу
module radial_holes(n, r, d, h) for (i = [0 : n - 1])
    rotate([0, 0, i*360/n]) translate([r, 0, 0]) thru(d, h);
// main file
// ============================================================================
//  ПРОТИВОВЕС ТОНАРМА
//
//  Стакан, который надевается на хвостовик и фиксируется винтом.
//  Полость сзади засыпается дробью/гайками М8 и заливается эпоксидкой:
//  так массу можно подобрать под конкретную головку (для AT91 с
//  прижимной силой ~2 г нужно порядка 25-30 г на вылете ~30 мм).
//  Точная настройка — продольным перемещением по хвостовику.
//
//  Печать: стоя, открытой полостью вверх.
// ============================================================================

include <../params.scad>
use <../lib/common.scad>

module tonearm_counterweight(az = arm_tube_azimuth_at(arm_groove_r_out)) {
    bore_d  = arm_cw_stub_d + arm_cw_bore_clr;
    hub_od  = bore_d + 2*arm_cw_wall;
    cav_d   = arm_cw_d - 2*arm_cw_wall;
    cav_h   = arm_cw_h - 4;
    cw_x    = -(arm_cw_center_dist + arm_cw_h/2);   // задний торец стакана
    translate([arm_pivot_pos[0], arm_pivot_pos[1], arm_axis_z]) rotate([0, 0, az])
    translate([cw_x, 0, 0]) rotate([0, 90, 0]) difference() {
        union() {
            chamfered_cyl(arm_cw_d, arm_cw_h, ch = 1);
            cylinder(d = hub_od, h = arm_cw_h);
        }
        // полость под груз (открыта в сторону хвостовика)
        difference() {
            translate([0, 0, -eps]) cylinder(d = cav_d, h = cav_h + eps);
            translate([0, 0, -2*eps]) cylinder(d = hub_od, h = cav_h + 4*eps);
        }
        // посадка на хвостовик
        thru(bore_d, arm_cw_h);
        // фиксирующий винт — в сплошной передней части стакана, а не в полости
        translate([0, 0, arm_cw_h - 2]) rotate([0, 90, 0])
            cylinder(d = scr3_pilot, h = arm_cw_d);
    }
}

tonearm_counterweight();
